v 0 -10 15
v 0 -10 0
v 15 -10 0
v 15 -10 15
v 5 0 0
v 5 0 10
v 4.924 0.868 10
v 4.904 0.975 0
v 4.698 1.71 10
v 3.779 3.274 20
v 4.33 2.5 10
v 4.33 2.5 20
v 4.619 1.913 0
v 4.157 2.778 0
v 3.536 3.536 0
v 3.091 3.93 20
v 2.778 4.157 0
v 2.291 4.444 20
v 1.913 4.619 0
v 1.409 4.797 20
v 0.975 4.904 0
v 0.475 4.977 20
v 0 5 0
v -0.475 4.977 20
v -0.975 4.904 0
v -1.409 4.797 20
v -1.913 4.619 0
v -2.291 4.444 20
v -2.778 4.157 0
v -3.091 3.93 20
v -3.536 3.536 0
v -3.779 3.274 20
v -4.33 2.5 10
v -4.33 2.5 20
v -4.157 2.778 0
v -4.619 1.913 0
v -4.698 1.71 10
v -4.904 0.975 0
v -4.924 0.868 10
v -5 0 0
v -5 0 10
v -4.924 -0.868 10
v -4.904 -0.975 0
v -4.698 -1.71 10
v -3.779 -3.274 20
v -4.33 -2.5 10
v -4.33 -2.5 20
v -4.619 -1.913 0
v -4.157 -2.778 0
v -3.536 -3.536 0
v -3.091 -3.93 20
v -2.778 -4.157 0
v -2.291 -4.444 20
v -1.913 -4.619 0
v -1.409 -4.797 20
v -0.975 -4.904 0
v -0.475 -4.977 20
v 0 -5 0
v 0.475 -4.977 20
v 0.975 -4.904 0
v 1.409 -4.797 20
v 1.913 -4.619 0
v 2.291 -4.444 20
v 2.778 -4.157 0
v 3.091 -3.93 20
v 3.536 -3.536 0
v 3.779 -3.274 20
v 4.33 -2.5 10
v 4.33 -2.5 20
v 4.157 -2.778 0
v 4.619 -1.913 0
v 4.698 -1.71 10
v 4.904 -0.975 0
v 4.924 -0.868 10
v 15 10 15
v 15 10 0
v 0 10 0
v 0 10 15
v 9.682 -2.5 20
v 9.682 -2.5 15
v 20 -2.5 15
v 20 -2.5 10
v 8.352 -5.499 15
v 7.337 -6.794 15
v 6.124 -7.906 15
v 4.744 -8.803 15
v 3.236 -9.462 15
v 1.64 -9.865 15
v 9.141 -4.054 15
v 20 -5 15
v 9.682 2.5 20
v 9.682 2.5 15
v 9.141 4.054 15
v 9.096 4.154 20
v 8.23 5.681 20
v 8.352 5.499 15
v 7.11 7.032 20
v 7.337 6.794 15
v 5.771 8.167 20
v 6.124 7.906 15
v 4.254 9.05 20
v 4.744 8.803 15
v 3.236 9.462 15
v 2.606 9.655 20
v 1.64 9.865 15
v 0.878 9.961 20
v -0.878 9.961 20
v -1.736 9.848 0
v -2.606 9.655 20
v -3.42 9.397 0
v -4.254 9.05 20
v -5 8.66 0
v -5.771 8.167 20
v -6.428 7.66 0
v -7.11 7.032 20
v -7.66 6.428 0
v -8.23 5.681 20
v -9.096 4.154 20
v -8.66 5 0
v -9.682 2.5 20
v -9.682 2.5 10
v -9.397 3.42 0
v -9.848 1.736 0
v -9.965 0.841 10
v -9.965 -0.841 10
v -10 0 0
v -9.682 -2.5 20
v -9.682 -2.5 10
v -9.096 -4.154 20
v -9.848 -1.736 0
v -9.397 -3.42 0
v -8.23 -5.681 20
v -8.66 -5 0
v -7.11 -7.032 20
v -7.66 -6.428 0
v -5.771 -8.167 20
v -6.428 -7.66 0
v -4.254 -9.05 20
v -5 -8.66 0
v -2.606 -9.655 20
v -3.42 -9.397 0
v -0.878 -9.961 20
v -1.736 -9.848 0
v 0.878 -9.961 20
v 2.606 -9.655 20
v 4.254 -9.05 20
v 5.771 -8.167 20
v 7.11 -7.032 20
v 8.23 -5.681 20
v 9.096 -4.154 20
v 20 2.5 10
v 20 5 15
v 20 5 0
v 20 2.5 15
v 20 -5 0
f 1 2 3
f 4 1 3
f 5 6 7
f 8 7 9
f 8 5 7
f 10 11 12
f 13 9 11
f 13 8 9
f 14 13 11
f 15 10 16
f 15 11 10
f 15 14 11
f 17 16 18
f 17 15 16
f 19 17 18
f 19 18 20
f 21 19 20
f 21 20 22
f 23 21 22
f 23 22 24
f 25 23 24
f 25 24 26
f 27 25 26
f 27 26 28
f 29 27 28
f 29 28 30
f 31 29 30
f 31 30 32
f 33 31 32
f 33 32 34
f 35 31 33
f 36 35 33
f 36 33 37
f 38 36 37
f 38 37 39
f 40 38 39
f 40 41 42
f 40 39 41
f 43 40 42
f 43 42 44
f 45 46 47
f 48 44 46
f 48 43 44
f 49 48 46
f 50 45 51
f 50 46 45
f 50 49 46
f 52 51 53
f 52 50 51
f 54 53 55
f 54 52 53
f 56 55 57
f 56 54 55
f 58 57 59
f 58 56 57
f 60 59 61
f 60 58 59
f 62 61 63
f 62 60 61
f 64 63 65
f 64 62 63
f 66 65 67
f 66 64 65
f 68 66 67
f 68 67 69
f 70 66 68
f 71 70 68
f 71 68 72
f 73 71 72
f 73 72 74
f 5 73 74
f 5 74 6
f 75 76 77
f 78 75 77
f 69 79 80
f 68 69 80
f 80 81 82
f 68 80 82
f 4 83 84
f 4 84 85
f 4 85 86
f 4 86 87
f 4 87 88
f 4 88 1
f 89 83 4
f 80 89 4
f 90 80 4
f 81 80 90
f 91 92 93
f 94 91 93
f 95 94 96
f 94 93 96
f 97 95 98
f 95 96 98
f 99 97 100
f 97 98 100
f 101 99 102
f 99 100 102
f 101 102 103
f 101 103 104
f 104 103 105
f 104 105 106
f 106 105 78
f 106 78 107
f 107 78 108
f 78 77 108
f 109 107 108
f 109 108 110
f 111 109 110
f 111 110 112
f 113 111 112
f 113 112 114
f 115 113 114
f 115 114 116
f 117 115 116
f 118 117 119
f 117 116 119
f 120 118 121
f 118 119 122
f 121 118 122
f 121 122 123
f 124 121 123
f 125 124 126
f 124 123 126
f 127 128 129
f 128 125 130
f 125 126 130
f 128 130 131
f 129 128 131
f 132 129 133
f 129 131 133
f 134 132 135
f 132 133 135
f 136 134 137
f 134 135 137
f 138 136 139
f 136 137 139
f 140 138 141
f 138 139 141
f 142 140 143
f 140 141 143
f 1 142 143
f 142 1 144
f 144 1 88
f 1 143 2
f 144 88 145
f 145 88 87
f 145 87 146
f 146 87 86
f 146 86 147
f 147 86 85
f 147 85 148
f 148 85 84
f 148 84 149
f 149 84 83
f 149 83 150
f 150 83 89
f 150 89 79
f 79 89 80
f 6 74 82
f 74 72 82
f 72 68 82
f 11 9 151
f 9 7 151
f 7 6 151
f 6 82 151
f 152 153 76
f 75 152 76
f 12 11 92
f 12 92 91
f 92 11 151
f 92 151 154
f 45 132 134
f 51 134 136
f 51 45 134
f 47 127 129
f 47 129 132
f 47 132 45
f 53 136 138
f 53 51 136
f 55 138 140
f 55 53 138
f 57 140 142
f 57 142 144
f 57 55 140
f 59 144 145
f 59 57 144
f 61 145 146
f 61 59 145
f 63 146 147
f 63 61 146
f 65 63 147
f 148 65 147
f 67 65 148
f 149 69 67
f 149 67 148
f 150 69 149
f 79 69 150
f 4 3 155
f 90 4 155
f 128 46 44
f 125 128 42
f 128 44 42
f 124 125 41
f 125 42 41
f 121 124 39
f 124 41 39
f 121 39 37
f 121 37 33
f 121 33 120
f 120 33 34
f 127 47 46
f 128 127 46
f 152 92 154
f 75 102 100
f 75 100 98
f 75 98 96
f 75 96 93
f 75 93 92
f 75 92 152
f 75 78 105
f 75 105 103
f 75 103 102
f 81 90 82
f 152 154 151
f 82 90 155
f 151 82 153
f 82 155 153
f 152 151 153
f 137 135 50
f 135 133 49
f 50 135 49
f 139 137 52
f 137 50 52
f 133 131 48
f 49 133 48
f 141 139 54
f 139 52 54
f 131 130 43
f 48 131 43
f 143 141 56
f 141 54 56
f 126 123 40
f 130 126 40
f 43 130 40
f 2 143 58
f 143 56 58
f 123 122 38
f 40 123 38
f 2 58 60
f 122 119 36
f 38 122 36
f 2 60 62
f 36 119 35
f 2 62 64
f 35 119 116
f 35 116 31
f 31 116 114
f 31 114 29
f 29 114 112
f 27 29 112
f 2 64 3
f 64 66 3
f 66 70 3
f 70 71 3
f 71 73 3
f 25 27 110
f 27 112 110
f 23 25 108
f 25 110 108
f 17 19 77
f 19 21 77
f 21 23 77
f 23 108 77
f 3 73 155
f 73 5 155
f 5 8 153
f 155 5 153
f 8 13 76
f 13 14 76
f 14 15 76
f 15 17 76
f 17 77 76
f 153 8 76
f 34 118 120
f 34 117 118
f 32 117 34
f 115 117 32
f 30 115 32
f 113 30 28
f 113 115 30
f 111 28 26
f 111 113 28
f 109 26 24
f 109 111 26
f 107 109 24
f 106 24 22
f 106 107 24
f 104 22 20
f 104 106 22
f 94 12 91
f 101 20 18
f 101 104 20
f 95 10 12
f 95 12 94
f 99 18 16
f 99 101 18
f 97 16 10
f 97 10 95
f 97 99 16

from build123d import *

# Parameters (mm, degrees)
F0_R     = 5
F1_DEPTH = 15
F2_DEPTH = 20
F4_DEPTH = 30.001


with BuildPart() as f1:
    # F0 (on Top) → F1 (new body)
    with BuildSketch(Plane.XY):
        with BuildLine():
            ThreePointArc((0, -10), (10, 0), (0, 10))
            ThreePointArc((0, 10), (-10, 0), (0, -10))
        make_face()
        Circle(F0_R, mode=Mode.SUBTRACT)
        with BuildLine():
            Line((15, 10), (0, 10))
            ThreePointArc((0, 10), (10, 0), (0, -10))
            Line((0, -10), (15, -10))
            Line((15, -10), (20, -5))
            Line((20, -5), (20, 5))
            Line((20, 5), (15, 10))
        make_face()
    extrude(amount=F1_DEPTH)

    # F0 (on Top) → F2 (join)
    with BuildSketch(Plane.XY):
        with BuildLine():
            ThreePointArc((0, -10), (10, 0), (0, 10))
            ThreePointArc((0, 10), (-10, 0), (0, -10))
        make_face()
        Circle(F0_R, mode=Mode.SUBTRACT)
    extrude(amount=F2_DEPTH)

    # F3 (on face) → F4 (cut, through all)
    with BuildSketch(Plane.YZ.offset(20)):
        Polygon((2.5, 10), (2.5, 15), (2.5, 20), (-2.5, 20), (-2.5, 15), (-2.5, 10), align=None)
    extrude(amount=-F4_DEPTH, mode=Mode.SUBTRACT)


solid = f1.part
